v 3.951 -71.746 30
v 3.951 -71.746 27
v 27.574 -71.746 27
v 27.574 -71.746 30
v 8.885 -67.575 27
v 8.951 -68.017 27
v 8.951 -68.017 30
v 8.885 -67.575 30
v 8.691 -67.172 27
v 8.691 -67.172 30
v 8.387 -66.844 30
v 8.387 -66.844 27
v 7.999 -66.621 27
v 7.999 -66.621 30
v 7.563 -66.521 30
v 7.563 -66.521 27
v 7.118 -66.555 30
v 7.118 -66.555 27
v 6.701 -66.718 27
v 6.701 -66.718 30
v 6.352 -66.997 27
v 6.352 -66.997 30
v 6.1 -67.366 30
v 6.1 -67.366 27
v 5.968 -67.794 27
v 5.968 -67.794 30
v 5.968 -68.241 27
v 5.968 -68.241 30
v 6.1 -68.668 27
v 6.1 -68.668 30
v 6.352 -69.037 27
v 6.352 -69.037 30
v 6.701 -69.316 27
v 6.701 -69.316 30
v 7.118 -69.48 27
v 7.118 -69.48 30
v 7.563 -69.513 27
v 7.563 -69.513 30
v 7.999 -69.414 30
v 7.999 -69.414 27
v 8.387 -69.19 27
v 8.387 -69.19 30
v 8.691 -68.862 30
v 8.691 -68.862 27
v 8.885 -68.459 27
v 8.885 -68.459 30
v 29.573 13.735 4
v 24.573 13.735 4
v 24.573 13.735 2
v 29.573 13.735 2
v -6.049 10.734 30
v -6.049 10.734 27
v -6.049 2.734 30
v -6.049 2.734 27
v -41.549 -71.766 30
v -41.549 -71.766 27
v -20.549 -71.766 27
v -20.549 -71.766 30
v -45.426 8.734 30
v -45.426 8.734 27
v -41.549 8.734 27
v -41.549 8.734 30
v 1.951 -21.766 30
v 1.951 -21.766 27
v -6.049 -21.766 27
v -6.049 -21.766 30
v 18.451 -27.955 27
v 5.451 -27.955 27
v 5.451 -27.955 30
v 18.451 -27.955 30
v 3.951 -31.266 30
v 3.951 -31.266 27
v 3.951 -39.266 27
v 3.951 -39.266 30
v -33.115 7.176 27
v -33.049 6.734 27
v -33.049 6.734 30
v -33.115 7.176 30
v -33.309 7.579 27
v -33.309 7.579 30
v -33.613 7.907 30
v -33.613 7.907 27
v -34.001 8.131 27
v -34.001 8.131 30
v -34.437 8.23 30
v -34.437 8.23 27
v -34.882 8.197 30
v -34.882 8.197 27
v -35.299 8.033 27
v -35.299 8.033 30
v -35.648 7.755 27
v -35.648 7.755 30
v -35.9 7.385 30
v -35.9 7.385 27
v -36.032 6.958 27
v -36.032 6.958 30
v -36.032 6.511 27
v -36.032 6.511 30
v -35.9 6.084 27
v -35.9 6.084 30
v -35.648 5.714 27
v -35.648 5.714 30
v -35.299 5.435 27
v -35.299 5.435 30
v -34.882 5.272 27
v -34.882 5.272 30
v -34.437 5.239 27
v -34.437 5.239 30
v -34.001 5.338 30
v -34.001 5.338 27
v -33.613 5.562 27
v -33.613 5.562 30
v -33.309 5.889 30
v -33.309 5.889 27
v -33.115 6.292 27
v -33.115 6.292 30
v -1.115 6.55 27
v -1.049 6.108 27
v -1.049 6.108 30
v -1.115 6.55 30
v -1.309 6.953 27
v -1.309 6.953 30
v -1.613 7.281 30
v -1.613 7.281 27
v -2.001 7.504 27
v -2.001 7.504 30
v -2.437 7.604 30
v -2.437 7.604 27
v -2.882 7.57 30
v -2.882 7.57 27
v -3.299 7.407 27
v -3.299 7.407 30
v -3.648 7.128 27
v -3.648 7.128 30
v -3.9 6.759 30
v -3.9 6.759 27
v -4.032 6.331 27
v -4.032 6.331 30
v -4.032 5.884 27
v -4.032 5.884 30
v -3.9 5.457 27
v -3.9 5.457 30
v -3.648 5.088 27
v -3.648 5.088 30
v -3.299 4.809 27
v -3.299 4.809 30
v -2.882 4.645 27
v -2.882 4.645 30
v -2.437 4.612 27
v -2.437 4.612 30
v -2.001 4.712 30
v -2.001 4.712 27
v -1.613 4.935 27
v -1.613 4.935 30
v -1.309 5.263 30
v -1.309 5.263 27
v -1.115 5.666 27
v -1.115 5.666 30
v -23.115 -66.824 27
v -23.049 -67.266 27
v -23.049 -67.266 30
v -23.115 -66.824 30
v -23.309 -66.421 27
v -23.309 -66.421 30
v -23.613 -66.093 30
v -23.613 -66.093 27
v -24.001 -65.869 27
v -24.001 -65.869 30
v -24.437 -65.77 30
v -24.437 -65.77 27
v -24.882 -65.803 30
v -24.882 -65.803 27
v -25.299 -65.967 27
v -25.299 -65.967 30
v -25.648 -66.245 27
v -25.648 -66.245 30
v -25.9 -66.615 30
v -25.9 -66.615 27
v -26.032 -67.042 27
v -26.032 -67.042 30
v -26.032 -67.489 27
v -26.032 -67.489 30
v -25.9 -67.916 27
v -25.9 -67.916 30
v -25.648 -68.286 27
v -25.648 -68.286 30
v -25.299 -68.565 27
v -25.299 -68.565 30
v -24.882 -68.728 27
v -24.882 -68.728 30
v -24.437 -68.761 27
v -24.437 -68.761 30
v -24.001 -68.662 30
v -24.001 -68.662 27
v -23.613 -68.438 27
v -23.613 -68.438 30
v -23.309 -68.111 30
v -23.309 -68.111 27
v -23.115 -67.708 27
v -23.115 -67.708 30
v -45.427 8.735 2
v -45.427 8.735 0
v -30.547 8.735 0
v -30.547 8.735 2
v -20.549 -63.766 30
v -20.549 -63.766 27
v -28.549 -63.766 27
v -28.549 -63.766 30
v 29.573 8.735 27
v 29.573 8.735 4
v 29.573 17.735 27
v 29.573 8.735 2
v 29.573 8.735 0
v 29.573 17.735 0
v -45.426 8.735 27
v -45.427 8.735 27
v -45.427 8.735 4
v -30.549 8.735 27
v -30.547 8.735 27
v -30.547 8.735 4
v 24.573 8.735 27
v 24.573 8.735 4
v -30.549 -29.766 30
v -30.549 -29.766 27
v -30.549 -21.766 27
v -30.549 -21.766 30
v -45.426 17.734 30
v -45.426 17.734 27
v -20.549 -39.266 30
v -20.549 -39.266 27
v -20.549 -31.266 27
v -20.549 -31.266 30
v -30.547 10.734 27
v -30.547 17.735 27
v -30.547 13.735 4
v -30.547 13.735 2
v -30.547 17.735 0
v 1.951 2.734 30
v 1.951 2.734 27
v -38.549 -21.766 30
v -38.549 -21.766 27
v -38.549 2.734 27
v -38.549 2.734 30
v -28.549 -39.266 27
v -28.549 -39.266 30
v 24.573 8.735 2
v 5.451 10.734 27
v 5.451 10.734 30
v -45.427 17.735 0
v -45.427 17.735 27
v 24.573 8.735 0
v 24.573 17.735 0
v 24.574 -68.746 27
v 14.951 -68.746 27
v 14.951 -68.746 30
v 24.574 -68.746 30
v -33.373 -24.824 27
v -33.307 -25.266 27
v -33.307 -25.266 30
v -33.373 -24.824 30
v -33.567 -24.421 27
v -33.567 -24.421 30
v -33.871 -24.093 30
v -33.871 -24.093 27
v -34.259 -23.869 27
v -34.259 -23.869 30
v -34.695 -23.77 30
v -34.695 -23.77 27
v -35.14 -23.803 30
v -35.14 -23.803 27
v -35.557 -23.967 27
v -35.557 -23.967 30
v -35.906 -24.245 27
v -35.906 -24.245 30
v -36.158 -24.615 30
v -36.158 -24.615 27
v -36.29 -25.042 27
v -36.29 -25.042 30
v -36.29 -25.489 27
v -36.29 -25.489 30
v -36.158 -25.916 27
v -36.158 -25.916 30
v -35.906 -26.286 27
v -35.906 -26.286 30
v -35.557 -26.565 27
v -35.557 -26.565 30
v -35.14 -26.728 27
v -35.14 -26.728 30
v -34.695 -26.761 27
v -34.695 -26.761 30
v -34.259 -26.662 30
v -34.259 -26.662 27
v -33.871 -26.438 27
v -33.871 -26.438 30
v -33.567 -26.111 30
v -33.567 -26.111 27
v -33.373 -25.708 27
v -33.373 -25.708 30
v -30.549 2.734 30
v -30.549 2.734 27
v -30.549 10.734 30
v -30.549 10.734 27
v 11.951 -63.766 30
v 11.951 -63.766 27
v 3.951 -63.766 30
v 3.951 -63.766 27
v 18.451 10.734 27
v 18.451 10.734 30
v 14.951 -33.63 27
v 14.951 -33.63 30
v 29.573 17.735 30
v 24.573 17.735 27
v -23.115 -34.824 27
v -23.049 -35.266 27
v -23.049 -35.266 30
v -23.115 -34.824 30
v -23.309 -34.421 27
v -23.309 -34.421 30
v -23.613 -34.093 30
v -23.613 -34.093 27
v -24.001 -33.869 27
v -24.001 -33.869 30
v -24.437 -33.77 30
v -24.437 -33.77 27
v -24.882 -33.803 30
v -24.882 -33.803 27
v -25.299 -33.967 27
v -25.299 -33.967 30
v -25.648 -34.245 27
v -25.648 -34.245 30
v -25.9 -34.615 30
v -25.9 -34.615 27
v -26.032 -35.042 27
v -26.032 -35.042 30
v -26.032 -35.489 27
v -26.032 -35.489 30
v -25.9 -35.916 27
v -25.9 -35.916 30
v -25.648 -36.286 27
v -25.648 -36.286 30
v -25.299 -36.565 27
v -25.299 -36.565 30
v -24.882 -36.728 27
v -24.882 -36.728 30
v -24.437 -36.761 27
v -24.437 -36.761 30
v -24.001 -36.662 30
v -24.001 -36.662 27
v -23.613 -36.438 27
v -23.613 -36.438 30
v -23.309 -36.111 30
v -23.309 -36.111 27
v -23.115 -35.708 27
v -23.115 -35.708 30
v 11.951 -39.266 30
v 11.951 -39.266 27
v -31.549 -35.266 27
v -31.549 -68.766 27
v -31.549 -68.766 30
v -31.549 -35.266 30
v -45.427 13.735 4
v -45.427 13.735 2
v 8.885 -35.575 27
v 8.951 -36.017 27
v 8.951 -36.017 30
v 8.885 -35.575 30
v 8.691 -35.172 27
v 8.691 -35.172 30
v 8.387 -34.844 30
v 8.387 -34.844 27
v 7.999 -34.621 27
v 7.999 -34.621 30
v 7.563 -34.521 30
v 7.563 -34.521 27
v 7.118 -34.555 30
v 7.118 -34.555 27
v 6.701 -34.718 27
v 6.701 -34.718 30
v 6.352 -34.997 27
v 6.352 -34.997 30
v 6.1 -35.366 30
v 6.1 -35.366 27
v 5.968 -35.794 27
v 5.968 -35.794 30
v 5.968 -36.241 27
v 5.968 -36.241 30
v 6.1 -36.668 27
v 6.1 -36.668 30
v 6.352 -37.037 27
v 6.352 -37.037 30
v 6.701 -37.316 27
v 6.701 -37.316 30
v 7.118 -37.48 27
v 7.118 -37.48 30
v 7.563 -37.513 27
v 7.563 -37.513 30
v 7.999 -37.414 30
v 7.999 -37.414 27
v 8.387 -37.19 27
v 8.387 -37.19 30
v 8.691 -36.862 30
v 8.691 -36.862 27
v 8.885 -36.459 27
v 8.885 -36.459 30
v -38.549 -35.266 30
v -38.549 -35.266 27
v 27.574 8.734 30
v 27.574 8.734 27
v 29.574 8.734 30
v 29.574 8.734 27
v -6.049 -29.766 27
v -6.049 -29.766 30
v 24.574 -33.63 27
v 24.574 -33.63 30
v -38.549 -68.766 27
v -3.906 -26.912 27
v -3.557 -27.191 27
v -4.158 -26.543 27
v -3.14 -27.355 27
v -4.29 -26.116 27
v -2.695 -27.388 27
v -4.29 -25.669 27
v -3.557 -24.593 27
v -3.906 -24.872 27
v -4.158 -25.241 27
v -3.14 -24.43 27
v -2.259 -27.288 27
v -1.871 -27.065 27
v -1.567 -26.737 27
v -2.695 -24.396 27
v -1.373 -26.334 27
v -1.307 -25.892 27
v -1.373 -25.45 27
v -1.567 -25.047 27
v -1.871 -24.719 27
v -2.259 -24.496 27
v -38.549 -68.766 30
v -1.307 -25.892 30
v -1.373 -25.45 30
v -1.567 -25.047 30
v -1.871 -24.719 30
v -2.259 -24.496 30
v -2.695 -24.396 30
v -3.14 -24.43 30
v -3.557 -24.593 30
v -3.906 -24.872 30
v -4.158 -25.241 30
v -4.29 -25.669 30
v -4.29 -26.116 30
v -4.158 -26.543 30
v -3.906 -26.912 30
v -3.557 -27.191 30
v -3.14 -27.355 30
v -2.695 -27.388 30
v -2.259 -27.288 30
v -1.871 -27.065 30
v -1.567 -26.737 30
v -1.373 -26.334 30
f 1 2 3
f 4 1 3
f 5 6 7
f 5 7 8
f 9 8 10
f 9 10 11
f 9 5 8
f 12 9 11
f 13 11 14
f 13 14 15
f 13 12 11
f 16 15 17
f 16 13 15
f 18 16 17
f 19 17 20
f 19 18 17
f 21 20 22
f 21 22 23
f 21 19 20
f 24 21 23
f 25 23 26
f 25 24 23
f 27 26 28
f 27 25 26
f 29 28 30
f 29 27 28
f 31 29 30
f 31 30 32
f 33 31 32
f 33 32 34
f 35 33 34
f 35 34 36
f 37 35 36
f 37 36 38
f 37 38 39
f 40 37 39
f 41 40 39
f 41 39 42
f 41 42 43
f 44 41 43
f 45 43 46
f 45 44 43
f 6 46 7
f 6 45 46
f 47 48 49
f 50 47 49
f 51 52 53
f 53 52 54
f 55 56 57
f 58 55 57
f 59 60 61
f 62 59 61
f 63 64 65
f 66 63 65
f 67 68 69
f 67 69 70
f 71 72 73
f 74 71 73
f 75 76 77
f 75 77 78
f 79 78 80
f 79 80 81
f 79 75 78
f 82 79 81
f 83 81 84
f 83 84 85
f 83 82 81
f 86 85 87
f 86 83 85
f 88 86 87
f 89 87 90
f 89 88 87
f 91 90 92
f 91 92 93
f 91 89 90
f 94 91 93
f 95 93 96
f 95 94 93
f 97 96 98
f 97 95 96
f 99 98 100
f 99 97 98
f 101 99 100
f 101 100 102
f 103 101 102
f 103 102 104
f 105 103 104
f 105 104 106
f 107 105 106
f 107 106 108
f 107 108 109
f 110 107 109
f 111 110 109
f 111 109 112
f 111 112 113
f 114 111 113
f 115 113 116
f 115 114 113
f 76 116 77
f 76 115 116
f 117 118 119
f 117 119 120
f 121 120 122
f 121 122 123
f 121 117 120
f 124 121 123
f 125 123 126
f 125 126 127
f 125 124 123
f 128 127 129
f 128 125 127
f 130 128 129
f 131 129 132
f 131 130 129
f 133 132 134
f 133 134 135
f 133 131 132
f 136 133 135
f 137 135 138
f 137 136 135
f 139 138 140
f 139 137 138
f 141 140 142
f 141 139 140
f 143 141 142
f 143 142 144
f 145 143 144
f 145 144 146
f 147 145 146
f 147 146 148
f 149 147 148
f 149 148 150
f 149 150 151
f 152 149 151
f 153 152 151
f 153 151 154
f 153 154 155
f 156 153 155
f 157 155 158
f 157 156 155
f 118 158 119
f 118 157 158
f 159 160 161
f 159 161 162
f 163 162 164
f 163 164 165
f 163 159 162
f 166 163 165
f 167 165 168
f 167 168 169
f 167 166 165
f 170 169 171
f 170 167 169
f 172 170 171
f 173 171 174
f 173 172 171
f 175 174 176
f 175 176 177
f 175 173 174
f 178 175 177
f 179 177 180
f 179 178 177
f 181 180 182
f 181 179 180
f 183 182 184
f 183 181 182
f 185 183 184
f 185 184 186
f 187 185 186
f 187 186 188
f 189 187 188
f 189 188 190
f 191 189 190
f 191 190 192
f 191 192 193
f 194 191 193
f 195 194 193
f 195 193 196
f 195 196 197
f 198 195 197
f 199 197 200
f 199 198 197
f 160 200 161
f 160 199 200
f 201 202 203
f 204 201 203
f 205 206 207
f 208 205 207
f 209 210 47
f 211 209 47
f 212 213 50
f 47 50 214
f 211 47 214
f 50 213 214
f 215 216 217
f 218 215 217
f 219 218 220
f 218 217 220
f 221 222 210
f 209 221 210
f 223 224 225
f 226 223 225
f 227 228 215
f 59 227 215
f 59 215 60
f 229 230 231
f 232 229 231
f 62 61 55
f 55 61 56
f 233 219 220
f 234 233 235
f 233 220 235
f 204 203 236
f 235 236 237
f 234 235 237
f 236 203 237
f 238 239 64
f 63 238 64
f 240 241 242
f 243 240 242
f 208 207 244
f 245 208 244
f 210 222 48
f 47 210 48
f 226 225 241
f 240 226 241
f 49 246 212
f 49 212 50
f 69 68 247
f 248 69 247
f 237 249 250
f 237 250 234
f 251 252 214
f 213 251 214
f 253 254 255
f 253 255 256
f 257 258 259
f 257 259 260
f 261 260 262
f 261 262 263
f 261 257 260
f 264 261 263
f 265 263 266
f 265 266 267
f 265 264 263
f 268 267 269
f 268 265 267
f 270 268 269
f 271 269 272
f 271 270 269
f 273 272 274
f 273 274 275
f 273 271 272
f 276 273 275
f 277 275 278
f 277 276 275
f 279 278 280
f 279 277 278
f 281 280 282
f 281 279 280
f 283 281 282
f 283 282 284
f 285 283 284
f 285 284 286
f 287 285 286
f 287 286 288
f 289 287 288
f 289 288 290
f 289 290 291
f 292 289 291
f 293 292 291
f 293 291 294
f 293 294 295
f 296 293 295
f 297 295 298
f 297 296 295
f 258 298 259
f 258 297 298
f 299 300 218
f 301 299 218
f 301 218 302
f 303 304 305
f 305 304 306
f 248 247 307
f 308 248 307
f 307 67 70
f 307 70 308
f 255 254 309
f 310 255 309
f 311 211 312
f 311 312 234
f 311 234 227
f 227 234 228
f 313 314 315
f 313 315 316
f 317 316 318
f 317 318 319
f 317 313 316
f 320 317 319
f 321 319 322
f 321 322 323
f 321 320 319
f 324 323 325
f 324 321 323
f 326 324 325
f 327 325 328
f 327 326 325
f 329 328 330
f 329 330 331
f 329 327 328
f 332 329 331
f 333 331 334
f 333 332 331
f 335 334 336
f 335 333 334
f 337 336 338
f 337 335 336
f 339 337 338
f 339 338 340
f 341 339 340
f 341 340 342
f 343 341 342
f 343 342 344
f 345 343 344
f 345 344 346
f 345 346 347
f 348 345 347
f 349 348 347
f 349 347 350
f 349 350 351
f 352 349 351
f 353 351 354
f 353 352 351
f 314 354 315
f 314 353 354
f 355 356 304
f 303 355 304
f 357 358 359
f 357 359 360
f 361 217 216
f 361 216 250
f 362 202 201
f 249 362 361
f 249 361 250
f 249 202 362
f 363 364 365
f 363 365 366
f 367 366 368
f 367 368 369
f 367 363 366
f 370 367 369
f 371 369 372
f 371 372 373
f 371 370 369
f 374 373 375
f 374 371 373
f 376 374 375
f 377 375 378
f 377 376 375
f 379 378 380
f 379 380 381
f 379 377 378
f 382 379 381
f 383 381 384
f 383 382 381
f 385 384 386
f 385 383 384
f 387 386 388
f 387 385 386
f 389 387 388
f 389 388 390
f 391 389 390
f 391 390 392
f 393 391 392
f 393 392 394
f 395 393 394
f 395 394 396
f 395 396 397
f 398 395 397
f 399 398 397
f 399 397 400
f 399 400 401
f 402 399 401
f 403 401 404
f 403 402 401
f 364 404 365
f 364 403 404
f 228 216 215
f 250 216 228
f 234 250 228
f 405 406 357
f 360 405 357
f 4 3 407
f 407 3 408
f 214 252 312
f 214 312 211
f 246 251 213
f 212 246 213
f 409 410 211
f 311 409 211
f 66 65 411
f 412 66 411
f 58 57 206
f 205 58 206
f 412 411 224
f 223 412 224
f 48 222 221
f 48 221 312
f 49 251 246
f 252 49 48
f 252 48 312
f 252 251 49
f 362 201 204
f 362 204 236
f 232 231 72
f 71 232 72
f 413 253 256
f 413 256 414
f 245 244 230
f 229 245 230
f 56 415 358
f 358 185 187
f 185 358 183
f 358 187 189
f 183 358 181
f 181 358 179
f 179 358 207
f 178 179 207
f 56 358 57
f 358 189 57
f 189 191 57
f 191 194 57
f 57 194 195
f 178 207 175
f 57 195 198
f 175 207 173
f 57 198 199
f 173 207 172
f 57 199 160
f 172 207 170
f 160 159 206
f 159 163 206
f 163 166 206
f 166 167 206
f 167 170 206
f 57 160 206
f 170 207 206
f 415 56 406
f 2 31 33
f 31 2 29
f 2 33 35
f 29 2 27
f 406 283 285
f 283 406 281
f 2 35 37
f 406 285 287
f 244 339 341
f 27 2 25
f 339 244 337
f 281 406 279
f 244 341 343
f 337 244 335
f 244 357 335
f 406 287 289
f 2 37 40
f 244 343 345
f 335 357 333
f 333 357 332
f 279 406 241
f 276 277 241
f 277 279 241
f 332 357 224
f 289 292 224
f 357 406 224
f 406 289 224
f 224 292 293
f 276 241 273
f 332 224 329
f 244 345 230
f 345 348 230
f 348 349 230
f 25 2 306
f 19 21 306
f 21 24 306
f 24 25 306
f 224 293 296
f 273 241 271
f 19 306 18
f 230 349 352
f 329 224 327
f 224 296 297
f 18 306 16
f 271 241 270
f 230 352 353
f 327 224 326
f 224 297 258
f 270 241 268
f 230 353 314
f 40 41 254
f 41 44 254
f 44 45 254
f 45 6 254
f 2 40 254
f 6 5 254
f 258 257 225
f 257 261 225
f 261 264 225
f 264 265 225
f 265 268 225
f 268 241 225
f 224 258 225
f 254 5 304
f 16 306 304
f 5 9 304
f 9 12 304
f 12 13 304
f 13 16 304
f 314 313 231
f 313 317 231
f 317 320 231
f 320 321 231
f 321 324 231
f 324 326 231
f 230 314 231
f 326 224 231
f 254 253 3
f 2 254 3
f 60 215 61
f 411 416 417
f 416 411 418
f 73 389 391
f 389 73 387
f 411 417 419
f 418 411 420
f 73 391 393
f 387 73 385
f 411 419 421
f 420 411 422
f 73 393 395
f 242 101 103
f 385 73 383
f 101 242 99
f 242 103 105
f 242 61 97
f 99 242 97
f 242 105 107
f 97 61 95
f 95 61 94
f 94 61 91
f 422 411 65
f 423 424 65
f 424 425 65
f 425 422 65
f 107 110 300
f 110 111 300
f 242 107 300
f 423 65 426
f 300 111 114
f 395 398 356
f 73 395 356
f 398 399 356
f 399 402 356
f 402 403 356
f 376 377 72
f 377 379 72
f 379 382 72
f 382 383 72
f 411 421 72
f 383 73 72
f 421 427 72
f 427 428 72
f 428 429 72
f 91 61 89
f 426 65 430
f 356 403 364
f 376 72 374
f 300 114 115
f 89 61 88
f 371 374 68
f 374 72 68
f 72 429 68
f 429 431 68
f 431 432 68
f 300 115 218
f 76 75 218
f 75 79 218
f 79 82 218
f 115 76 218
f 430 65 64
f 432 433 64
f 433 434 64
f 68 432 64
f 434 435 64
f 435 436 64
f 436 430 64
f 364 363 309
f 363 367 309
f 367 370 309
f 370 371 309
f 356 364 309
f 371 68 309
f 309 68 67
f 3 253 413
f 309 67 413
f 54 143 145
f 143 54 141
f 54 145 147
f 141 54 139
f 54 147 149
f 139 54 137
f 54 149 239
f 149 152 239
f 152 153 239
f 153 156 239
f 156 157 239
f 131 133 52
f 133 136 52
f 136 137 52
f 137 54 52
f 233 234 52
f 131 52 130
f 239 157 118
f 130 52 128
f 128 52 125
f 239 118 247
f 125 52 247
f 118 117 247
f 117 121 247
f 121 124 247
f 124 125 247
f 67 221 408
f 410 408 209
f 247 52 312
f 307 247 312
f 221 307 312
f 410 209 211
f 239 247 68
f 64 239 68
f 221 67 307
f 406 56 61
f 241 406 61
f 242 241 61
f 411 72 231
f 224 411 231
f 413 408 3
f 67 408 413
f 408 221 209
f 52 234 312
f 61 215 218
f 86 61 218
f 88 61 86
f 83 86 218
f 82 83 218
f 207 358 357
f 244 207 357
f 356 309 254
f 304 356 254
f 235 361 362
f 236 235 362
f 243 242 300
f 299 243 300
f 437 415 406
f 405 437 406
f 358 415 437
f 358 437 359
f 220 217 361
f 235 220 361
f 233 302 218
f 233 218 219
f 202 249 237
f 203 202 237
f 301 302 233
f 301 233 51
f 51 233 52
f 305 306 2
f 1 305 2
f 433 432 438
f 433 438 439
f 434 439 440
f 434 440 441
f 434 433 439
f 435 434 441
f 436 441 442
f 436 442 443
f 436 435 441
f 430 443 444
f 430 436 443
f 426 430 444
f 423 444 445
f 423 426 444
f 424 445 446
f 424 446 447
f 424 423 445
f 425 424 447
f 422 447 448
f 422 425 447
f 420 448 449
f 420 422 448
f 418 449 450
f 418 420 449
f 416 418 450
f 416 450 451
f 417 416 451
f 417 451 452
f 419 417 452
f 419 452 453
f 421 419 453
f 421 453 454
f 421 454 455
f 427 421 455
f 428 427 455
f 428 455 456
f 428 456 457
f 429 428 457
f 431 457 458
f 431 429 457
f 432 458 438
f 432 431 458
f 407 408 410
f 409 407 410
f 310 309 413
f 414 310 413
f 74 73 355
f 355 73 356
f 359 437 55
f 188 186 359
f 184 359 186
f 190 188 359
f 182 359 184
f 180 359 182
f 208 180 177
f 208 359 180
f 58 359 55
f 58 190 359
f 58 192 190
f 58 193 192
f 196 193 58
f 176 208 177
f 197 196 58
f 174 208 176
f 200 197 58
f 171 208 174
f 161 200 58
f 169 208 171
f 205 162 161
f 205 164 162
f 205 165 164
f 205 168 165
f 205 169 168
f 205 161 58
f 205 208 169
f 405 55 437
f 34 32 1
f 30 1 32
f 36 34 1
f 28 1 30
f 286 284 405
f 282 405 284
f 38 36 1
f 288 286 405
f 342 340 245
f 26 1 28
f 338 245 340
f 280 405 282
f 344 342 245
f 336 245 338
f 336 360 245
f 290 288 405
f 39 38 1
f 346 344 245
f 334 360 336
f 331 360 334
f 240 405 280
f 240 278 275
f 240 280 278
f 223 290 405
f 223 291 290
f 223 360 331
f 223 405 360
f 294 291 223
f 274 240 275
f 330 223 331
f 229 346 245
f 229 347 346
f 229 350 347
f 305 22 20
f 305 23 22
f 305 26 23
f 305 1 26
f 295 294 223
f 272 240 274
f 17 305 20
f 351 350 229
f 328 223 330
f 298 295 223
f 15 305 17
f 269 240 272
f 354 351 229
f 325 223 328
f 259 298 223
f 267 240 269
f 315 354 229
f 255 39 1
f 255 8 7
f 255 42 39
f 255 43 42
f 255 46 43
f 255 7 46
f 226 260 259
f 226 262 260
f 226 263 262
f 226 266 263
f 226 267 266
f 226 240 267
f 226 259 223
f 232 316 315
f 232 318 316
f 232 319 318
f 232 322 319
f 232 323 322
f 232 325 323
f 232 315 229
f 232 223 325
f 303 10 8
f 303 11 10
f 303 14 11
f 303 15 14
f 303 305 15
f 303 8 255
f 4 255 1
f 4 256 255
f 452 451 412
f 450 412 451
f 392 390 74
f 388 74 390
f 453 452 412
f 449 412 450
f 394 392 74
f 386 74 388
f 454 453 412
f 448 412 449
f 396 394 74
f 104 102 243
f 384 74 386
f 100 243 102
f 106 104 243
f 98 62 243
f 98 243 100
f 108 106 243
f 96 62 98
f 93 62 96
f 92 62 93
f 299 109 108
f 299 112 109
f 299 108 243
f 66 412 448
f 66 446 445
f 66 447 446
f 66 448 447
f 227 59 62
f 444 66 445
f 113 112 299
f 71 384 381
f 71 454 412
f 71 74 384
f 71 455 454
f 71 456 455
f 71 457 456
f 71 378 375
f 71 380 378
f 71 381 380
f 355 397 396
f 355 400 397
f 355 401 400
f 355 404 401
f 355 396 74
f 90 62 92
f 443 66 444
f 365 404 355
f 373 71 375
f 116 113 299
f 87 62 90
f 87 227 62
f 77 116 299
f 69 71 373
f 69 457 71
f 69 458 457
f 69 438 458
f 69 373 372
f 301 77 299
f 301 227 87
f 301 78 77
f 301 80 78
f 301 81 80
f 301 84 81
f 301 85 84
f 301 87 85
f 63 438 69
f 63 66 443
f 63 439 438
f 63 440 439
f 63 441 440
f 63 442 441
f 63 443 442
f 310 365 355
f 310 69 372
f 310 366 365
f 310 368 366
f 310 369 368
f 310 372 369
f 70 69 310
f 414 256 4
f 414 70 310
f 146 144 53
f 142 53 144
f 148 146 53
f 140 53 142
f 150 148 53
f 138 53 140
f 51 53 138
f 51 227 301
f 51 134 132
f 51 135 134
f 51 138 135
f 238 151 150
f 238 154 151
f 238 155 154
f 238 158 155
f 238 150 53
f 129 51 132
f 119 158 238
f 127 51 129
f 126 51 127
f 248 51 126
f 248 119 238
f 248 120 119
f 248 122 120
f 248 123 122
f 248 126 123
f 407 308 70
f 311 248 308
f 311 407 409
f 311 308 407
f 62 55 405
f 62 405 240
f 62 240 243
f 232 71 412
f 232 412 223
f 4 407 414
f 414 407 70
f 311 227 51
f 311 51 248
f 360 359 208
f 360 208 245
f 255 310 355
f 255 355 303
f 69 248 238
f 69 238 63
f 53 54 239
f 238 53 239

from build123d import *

# Parameters (mm, degrees)
CROQUIS1_W                = 5
CROQUIS1_H                = 9
SALIENTE_EXTRUIR1_DEPTH   = 27
CROQUIS1_W_2              = 14.88
SALIENTE_EXTRUIR1_2_DEPTH = 27
CROQUIS2_R                = 1.5
CROQUIS2_W                = 9.622736673
CROQUIS2_H                = 35.115677267
CROQUIS2_W_2              = 7
CROQUIS2_H_2              = 33.5
CROQUIS2_W_3              = 13
CROQUIS2_H_3              = 38.689553843
SALIENTE_EXTRUIR2_DEPTH   = 3
CORTAR_EXTRUIR1_START     = -75
CROQUIS3_W                = 2
CROQUIS3_H                = 5
CORTAR_EXTRUIR1_DEPTH     = 75


with BuildPart() as part:
    # Croquis1 → Saliente-Extruir1 (new body)
    with BuildSketch(Plane.XY):
        with Locations((27.073193316, 13.235294118)):
            Rectangle(CROQUIS1_W, CROQUIS1_H)
    extrude(amount=SALIENTE_EXTRUIR1_DEPTH)



with BuildPart() as body_2:
    # Croquis1 → Saliente-Extruir1 2 (new body)
    with BuildSketch(Plane.XY):
        with Locations((-37.986806684, 13.235294118)):
            Rectangle(CROQUIS1_W_2, CROQUIS1_H)
    extrude(amount=SALIENTE_EXTRUIR1_2_DEPTH)


with BuildPart() as part_1:
    add(part.part)

    add(body_2.part)  # Saliente-Extruir2 merges body 2
    # Croquis2 → Saliente-Extruir2 (add)
    with BuildSketch(Plane.XY.offset(27)):
        Polygon((-45.425929091, 8.73433808), (-41.548665764, 8.73433808), (-41.548665764, -71.76566192), (-28.548665764, -71.76566192), (-20.548665764, -71.76566192), (-20.548665764, -63.76566192), (-28.548665764, -63.76566192), (-28.548665764, -39.26566192), (-20.548665764, -39.26566192), (-20.548665764, -31.26566192), (3.951334236, -31.26566192), (3.951334236, -39.26566192), (11.951334236, -39.26566192), (11.951334236, -63.76566192), (3.951334236, -63.76566192), (3.951334236, -71.745971947), (15.951334236, -71.745971947), (27.574070909, -71.745971947), (27.574070909, 8.73433808), (29.574070909, 8.73433808), (29.573193316, 17.735294118), (-45.425929091, 17.73433808), align=None)
        with Locations((-24.548665764, -35.26566192)):
            Circle(CROQUIS2_R, mode=Mode.SUBTRACT)
        with Locations((7.451334236, -36.017200949)):
            Circle(CROQUIS2_R, mode=Mode.SUBTRACT)
        with Locations((-24.548665764, -67.26566192)):
            Circle(CROQUIS2_R, mode=Mode.SUBTRACT)
        with Locations((7.451334236, -68.017200949)):
            Circle(CROQUIS2_R, mode=Mode.SUBTRACT)
        with Locations((-34.548665764, 6.73433808)):
            Circle(CROQUIS2_R, mode=Mode.SUBTRACT)
        with Locations((-34.806623414, -25.26566192)):
            Circle(CROQUIS2_R, mode=Mode.SUBTRACT)
        with Locations((-2.806623414, -25.892139455)):
            Circle(CROQUIS2_R, mode=Mode.SUBTRACT)
        with Locations((-2.548665764, 6.107860545)):
            Circle(CROQUIS2_R, mode=Mode.SUBTRACT)
        Polygon((-30.548665764, -29.76566192), (-30.548665764, -21.76566192), (-38.548665764, -21.76566192), (-38.548665764, 2.73433808), (-30.548665764, 2.73433808), (-30.548665764, 10.73433808), (-6.048665764, 10.73433808), (-6.048665764, 2.73433808), (1.951334236, 2.73433808), (1.951334236, -21.76566192), (-6.048665764, -21.76566192), (-6.048665764, -29.76566192), align=None, mode=Mode.SUBTRACT)
        with Locations((19.762702573, -51.188133314)):
            Rectangle(CROQUIS2_W, CROQUIS2_H, mode=Mode.SUBTRACT)
        with Locations((-35.048665764, -52.01566192)):
            Rectangle(CROQUIS2_W_2, CROQUIS2_H_2, mode=Mode.SUBTRACT)
        with Locations((11.951334236, -8.610438842)):
            Rectangle(CROQUIS2_W_3, CROQUIS2_H_3, mode=Mode.SUBTRACT)
    extrude(amount=SALIENTE_EXTRUIR2_DEPTH)

    # Croquis3 → Cortar-Extruir1 (cut)
    with BuildSketch(Plane(origin=(29.573193316, 0, 0), x_dir=(0, 0, -1), z_dir=(1, 0, 0)).offset(CORTAR_EXTRUIR1_START)):
        with Locations((-3, 11.235294118)):
            Rectangle(CROQUIS3_W, CROQUIS3_H)
    extrude(amount=CORTAR_EXTRUIR1_DEPTH, mode=Mode.SUBTRACT)


solid = part_1.part
